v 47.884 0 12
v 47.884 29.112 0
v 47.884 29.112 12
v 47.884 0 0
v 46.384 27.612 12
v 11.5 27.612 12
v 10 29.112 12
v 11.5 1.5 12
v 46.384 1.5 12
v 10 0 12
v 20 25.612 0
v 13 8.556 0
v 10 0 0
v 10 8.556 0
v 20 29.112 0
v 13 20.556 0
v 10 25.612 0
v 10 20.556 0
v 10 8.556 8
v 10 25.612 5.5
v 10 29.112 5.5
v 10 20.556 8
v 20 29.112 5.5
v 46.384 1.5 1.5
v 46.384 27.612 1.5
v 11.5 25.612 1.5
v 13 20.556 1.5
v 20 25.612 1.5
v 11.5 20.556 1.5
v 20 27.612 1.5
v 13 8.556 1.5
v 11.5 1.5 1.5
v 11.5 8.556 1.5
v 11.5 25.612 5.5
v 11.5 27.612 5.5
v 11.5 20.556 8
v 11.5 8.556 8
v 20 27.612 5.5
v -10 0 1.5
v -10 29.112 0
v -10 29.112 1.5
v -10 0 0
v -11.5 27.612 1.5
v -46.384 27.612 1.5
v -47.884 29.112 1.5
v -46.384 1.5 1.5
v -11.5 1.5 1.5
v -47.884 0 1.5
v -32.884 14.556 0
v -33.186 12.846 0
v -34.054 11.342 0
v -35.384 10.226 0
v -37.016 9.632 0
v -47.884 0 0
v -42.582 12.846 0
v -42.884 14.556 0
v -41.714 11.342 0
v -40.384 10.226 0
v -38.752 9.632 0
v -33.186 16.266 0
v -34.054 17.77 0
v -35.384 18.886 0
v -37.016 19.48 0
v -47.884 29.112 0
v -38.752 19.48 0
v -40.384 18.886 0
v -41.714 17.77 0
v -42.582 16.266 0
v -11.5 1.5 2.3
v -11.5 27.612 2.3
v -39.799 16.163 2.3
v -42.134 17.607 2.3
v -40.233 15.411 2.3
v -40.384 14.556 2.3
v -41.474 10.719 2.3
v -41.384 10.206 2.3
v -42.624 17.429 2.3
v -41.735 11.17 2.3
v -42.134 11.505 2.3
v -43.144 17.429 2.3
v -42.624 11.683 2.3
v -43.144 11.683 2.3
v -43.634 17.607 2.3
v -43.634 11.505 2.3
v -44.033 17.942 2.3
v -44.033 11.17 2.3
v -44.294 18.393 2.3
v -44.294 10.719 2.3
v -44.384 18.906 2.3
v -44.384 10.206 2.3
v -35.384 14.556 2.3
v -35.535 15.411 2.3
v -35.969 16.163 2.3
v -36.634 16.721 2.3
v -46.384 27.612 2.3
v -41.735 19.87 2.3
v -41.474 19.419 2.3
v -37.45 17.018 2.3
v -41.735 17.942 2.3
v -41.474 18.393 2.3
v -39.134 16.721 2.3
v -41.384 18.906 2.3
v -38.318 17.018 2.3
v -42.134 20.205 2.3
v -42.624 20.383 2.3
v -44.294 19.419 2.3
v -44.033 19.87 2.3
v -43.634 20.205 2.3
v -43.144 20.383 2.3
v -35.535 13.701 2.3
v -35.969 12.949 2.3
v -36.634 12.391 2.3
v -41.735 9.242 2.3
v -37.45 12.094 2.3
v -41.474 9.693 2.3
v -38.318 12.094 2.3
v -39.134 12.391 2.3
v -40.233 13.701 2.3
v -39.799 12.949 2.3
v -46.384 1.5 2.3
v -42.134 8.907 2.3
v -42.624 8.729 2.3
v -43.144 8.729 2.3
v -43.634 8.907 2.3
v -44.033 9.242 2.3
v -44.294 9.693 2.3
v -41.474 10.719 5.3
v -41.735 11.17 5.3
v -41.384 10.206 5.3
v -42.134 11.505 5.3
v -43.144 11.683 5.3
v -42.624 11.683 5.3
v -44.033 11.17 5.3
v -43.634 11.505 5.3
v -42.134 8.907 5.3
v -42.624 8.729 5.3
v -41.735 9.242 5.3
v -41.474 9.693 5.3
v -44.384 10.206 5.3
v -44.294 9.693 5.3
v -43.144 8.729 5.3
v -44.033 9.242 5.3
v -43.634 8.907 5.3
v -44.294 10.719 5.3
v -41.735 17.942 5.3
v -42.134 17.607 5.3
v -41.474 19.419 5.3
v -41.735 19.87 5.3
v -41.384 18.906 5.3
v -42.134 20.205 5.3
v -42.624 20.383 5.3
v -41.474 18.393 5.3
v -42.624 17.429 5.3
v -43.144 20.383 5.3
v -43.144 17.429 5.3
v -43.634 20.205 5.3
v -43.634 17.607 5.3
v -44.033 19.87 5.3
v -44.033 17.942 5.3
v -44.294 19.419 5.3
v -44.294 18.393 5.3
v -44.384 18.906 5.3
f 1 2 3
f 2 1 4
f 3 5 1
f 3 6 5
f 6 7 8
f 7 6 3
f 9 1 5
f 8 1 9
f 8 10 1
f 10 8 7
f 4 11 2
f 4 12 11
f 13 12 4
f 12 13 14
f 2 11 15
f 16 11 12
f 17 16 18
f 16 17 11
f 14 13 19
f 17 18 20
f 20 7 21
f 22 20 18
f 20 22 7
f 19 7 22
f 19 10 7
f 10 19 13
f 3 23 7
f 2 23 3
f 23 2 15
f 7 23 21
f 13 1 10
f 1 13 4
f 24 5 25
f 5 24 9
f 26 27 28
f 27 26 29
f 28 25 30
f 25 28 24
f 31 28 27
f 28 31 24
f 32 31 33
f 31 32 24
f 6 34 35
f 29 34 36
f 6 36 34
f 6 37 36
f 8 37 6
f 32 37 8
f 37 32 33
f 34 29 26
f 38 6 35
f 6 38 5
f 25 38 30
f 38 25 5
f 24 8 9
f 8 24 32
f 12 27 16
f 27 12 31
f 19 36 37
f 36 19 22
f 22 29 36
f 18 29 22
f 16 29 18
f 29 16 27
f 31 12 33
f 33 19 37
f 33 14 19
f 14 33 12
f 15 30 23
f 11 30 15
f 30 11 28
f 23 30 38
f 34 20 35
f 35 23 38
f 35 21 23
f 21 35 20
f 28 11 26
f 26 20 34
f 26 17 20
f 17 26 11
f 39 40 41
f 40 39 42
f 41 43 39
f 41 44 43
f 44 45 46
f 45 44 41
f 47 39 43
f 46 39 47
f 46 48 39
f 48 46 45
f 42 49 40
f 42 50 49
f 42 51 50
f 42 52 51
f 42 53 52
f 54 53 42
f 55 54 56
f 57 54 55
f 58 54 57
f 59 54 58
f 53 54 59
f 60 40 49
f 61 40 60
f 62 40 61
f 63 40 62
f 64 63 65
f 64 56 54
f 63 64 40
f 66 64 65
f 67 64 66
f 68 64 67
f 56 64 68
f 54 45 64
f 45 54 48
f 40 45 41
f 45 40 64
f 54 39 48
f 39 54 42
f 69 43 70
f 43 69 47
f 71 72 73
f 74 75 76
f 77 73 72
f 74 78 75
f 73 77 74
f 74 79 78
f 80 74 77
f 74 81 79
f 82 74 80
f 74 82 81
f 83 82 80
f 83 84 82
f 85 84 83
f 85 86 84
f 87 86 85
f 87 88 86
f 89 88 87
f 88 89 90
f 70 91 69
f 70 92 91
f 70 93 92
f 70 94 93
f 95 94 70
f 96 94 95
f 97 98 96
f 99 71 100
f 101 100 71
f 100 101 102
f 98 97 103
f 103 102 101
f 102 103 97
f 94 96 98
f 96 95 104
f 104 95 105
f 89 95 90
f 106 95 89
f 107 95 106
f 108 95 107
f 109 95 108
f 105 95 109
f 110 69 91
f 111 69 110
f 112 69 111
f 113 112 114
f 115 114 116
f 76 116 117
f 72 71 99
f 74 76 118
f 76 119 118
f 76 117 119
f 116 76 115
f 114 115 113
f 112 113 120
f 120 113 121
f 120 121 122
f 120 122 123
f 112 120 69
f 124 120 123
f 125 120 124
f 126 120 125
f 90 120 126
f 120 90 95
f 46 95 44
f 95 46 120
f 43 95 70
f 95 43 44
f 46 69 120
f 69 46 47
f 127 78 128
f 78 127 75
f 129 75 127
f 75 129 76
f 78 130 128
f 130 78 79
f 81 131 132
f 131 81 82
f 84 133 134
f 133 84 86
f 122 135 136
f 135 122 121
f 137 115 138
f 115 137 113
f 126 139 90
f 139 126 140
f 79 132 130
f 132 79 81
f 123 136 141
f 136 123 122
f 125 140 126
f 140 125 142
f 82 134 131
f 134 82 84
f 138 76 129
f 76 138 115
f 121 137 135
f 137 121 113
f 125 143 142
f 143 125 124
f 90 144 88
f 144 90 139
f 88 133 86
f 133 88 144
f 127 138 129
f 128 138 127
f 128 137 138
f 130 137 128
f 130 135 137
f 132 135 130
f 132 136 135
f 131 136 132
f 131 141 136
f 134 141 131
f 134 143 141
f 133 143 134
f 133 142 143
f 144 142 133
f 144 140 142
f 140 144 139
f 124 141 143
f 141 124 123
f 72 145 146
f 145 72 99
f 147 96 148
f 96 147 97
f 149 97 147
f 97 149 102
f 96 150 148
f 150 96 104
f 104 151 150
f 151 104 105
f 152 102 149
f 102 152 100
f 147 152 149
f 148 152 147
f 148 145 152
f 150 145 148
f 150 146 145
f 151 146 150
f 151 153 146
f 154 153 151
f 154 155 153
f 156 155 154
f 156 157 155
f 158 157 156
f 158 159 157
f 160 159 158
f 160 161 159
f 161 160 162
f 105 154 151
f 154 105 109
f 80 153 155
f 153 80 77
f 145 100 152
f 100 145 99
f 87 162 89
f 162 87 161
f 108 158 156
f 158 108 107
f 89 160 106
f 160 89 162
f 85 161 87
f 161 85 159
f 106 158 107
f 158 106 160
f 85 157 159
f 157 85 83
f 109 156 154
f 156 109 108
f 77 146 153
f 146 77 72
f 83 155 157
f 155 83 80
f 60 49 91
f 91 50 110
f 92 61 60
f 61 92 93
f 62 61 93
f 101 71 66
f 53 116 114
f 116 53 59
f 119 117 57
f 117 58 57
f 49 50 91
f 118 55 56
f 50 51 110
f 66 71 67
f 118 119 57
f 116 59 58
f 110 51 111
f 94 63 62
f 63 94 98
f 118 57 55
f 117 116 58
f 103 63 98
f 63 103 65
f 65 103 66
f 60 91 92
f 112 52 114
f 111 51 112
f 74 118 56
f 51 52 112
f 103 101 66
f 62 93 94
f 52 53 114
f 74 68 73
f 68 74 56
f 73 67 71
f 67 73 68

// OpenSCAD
length = 34.2 * 1.02;
width = 25.6 * 1.02;

hight = 12.0;

thickness = 1.5;
fudge = 0.8;

cylinder_fn = 18;

// case
translate([10, 0, 0])
difference()
{
    translate([0, 0, 0])
        cube([length + 2*thickness, width + 2*thickness, hight]);
    translate([thickness, thickness, thickness])
        cube([length, width, hight]);
    
    translate([0, width/2 + thickness - 6, 0])
        cube([3, 12 ,8]);
    translate([0, thickness + width - 2, 0])
        cube([10, 2 + thickness, 4 + thickness]);
}


// top
translate([-10 - length - 2*thickness, 0, 0])
difference()
{
    union()
    {
        translate([0, 0, 0])
            cube([length + 2*thickness, width + 2*thickness, thickness]);
        translate([thickness, thickness, 0])
            cube([length, width, thickness + fudge]);
    
        translate([5, width / 2 + thickness - 4.35, 0])
            cylinder(h = 3 + thickness + fudge, r = 1.5, $fn = cylinder_fn);
        translate([5, width / 2 + thickness + 4.35, 0])
            cylinder(h = 3 + thickness + fudge, r = 1.5, $fn = cylinder_fn);
    }
    
    translate([10, width / 2 + thickness, 0])
        cylinder(h = thickness + fudge, r2 = 2.5, r1 = 5, $fn = cylinder_fn);
}
